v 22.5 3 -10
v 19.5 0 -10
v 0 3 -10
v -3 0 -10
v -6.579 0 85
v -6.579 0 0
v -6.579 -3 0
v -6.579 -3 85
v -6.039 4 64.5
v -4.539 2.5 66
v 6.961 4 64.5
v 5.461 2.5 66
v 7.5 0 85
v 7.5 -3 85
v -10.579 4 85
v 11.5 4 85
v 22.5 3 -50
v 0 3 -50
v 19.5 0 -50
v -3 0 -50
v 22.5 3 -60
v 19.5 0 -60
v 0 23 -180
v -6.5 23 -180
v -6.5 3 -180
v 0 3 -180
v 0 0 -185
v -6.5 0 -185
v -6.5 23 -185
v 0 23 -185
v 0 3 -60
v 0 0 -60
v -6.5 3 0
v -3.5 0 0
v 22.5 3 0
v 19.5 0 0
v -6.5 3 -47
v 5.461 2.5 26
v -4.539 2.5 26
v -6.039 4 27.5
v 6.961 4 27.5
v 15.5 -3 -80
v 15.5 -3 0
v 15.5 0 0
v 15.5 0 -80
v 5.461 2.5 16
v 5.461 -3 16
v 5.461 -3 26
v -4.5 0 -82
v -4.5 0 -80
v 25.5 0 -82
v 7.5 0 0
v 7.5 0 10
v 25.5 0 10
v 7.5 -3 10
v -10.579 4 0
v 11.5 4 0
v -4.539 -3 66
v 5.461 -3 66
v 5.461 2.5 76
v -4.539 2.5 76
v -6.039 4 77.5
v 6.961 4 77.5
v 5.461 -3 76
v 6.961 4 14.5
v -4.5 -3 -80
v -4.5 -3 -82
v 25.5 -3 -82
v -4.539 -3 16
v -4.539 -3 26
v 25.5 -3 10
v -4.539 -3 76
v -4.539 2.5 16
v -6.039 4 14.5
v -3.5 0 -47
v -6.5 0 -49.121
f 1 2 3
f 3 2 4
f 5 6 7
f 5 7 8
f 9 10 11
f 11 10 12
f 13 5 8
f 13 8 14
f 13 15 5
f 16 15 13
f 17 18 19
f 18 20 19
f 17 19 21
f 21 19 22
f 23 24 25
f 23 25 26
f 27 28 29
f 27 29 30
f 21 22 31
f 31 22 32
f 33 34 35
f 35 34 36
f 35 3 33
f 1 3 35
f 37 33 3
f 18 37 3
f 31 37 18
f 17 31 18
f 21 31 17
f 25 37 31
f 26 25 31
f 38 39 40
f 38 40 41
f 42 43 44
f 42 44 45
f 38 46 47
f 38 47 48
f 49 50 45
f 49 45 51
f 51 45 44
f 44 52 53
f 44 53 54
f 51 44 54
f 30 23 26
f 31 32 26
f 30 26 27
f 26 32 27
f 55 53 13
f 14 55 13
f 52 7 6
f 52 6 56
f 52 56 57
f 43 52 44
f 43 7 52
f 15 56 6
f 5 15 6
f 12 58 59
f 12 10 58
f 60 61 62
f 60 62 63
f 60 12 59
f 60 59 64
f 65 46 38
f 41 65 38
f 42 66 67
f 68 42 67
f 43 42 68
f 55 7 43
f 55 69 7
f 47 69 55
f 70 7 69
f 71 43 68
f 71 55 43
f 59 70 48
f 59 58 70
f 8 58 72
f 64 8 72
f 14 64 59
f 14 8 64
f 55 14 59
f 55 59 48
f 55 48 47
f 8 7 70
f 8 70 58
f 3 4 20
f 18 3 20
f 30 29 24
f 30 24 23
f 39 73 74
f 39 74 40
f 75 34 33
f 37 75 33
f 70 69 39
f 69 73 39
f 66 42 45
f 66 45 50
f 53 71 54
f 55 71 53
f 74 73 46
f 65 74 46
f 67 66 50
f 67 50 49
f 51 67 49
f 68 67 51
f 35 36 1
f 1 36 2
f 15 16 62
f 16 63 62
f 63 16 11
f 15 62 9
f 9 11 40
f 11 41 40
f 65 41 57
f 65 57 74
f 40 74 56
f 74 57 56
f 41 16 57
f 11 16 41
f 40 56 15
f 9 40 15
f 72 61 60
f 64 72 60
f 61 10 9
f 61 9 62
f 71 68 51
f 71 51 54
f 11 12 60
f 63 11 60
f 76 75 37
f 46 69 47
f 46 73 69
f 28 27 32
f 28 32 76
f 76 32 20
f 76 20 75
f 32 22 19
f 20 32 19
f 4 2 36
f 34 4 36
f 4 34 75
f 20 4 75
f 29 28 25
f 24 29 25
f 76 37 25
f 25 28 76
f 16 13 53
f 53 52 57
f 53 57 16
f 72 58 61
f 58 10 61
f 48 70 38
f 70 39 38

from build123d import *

# Parameters (mm, degrees)
DODANIE_WYCI_GNI_CIE4_DEPTH = 3
SFAZOWANIE2_SIZE            = 3
SZKIC7_W                    = 6.5
SZKIC7_H                    = 5
DODANIE_WYCI_GNI_CIE5_DEPTH = 20
SFAZOWANIE3_START           = -50
SFAZOWANIE3_DEPTH           = 51
SFAZOWANIE4_SIZE            = 3
DODANIE_WYCI_GNI_CIE1_DEPTH = 85
SZKIC2_W                    = 10
SZKIC2_H                    = 10
WYTNIJ_WYCI_GNI_CIE1_DEPTH  = 80
SFAZOWANIE1_SIZE            = 1.5
SZKIC3_W                    = 14.078691808
SZKIC3_H                    = 85
SZKIC3_W_2                  = 10
SZKIC3_H_2                  = 10
DODANIE_WYCI_GNI_CIE2_DEPTH = 3
DODANIE_WYCI_GNI_CIE3_DEPTH = 3


with BuildPart() as part:
    # Szkic6 → Dodanie-wyciągnięcie4 (new body)
    with BuildSketch(Plane(origin=(0, 0, 0), x_dir=(1, 0, 0), z_dir=(0, 1, 0))):
        Polygon((0, 50), (22.5, 50), (22.5, 60), (0, 60), (0, 185), (-6.5, 185), (-6.5, 60), (-6.5, 0), (0, 0), (22.5, 0), (22.5, 10), (0, 10), align=None)
    extrude(amount=DODANIE_WYCI_GNI_CIE4_DEPTH)

    # Sfazowanie2
    sfazowanie2_edges = [part.edges().sort_by_distance(p)[0] for p in [
        (0, 0, -30),
        (22.5, 0, -55),
        (22.5, 0, -5),
    ]]
    chamfer(sfazowanie2_edges, length=SFAZOWANIE2_SIZE - 0.0001)  # a hair under: the kernel refuses the full size

    # Szkic7 → Dodanie-wyciągnięcie5 (add)
    with BuildSketch(Plane(origin=(0, 3, 0), x_dir=(1, 0, 0), z_dir=(0, 1, 0))):
        with Locations((-3.25, 182.5)):
            Rectangle(SZKIC7_W, SZKIC7_H)
    extrude(amount=DODANIE_WYCI_GNI_CIE5_DEPTH)

    # Sfazowanie3: read off the stored shape, not the designer's step
    # Sfazowanie3 outline → Sfazowanie3 (cut)
    with BuildSketch(Plane.XY.offset(SFAZOWANIE3_START)):
        Polygon((-6.5, 0), (-3.5, 0), (-6.5, 3), align=None)
    extrude(amount=SFAZOWANIE3_DEPTH, mode=Mode.SUBTRACT)

    # Sfazowanie4
    # the kernel refuses this chamfer: 3 mm, written as the material it adds along each edge
    with BuildSketch(Plane(origin=(1.95536344, -5.45536344, -50), x_dir=(0, 0, 1), z_dir=(-0.7071067811865476, 0.7071067811865476, 0))) as sfazowanie4_piece_1_section:
        Polygon((SFAZOWANIE4_SIZE, 0), (0, -SFAZOWANIE4_SIZE), (0, 0), align=None)
    sfazowanie4_piece_1 = extrude(amount=19.672738615, mode=Mode.PRIVATE)
    sfazowanie4_piece_1 = split(sfazowanie4_piece_1, bisect_by=Plane(origin=(1.95536344, 3, -50), z_dir=(0, -1, 0)), keep=Keep.TOP, mode=Mode.PRIVATE)
    sfazowanie4_piece_1 = split(sfazowanie4_piece_1, bisect_by=Plane(origin=(1.95536344, 0, -50), z_dir=(0, 1, 0)), keep=Keep.TOP, mode=Mode.PRIVATE)
    sfazowanie4_piece_1 = split(sfazowanie4_piece_1, bisect_by=Plane(origin=(-6.5, -5.45536344, -50), z_dir=(1, 0, 0)), keep=Keep.TOP, mode=Mode.PRIVATE)
    add(sfazowanie4_piece_1)


with BuildPart() as body_2:
    # Szkic1 → Dodanie-wyciągnięcie1 (new body)
    with BuildSketch(Plane.XY):
        Polygon((7.5, 0), (11.5, 4), (-10.578691808, 4), (-6.578691808, 0), align=None)
    extrude(amount=DODANIE_WYCI_GNI_CIE1_DEPTH)

    # Szkic2 → Wytnij-wyciągnięcie1 (cut)
    with BuildSketch(Plane.XZ):
        with Locations((0.460654096, 21)):
            Rectangle(SZKIC2_W, SZKIC2_H)
        with Locations((0.460654096, 71)):
            Rectangle(SZKIC2_W, SZKIC2_H)
    extrude(amount=-WYTNIJ_WYCI_GNI_CIE1_DEPTH, mode=Mode.SUBTRACT)

    # Sfazowanie1
    sfazowanie1_edges = [body_2.edges().sort_by_distance(p)[0] for p in [
        (0.460654096, 4, 76),
        (-4.539345904, 4, 71),
        (0.460654096, 4, 66),
        (5.460654096, 4, 71),
        (0.460654096, 4, 26),
        (-4.539345904, 4, 21),
        (0.460654096, 4, 16),
        (5.460654096, 4, 21),
    ]]
    chamfer(sfazowanie1_edges, length=SFAZOWANIE1_SIZE)

    # Szkic3 → Dodanie-wyciągnięcie2 (add)
    with BuildSketch(Plane.XZ):
        with Locations((0.460654096, 42.5)):
            Rectangle(SZKIC3_W, SZKIC3_H)
        with Locations((0.460654096, 21)):
            Rectangle(SZKIC3_W_2, SZKIC3_H_2, mode=Mode.SUBTRACT)
        with Locations((0.460654096, 71)):
            Rectangle(SZKIC3_W_2, SZKIC3_H_2, mode=Mode.SUBTRACT)
    extrude(amount=DODANIE_WYCI_GNI_CIE2_DEPTH)

    # Szkic5 → Dodanie-wyciągnięcie3 (add)
    with BuildSketch(Plane.XZ.offset(3)):
        Polygon((7.5, 10), (7.5, 0), (15.5, 0), (15.5, -80), (-4.5, -80), (-4.5, -82), (25.5, -82), (25.5, 10), align=None)
    extrude(amount=-DODANIE_WYCI_GNI_CIE3_DEPTH)


solid = Compound([part.part, body_2.part])
